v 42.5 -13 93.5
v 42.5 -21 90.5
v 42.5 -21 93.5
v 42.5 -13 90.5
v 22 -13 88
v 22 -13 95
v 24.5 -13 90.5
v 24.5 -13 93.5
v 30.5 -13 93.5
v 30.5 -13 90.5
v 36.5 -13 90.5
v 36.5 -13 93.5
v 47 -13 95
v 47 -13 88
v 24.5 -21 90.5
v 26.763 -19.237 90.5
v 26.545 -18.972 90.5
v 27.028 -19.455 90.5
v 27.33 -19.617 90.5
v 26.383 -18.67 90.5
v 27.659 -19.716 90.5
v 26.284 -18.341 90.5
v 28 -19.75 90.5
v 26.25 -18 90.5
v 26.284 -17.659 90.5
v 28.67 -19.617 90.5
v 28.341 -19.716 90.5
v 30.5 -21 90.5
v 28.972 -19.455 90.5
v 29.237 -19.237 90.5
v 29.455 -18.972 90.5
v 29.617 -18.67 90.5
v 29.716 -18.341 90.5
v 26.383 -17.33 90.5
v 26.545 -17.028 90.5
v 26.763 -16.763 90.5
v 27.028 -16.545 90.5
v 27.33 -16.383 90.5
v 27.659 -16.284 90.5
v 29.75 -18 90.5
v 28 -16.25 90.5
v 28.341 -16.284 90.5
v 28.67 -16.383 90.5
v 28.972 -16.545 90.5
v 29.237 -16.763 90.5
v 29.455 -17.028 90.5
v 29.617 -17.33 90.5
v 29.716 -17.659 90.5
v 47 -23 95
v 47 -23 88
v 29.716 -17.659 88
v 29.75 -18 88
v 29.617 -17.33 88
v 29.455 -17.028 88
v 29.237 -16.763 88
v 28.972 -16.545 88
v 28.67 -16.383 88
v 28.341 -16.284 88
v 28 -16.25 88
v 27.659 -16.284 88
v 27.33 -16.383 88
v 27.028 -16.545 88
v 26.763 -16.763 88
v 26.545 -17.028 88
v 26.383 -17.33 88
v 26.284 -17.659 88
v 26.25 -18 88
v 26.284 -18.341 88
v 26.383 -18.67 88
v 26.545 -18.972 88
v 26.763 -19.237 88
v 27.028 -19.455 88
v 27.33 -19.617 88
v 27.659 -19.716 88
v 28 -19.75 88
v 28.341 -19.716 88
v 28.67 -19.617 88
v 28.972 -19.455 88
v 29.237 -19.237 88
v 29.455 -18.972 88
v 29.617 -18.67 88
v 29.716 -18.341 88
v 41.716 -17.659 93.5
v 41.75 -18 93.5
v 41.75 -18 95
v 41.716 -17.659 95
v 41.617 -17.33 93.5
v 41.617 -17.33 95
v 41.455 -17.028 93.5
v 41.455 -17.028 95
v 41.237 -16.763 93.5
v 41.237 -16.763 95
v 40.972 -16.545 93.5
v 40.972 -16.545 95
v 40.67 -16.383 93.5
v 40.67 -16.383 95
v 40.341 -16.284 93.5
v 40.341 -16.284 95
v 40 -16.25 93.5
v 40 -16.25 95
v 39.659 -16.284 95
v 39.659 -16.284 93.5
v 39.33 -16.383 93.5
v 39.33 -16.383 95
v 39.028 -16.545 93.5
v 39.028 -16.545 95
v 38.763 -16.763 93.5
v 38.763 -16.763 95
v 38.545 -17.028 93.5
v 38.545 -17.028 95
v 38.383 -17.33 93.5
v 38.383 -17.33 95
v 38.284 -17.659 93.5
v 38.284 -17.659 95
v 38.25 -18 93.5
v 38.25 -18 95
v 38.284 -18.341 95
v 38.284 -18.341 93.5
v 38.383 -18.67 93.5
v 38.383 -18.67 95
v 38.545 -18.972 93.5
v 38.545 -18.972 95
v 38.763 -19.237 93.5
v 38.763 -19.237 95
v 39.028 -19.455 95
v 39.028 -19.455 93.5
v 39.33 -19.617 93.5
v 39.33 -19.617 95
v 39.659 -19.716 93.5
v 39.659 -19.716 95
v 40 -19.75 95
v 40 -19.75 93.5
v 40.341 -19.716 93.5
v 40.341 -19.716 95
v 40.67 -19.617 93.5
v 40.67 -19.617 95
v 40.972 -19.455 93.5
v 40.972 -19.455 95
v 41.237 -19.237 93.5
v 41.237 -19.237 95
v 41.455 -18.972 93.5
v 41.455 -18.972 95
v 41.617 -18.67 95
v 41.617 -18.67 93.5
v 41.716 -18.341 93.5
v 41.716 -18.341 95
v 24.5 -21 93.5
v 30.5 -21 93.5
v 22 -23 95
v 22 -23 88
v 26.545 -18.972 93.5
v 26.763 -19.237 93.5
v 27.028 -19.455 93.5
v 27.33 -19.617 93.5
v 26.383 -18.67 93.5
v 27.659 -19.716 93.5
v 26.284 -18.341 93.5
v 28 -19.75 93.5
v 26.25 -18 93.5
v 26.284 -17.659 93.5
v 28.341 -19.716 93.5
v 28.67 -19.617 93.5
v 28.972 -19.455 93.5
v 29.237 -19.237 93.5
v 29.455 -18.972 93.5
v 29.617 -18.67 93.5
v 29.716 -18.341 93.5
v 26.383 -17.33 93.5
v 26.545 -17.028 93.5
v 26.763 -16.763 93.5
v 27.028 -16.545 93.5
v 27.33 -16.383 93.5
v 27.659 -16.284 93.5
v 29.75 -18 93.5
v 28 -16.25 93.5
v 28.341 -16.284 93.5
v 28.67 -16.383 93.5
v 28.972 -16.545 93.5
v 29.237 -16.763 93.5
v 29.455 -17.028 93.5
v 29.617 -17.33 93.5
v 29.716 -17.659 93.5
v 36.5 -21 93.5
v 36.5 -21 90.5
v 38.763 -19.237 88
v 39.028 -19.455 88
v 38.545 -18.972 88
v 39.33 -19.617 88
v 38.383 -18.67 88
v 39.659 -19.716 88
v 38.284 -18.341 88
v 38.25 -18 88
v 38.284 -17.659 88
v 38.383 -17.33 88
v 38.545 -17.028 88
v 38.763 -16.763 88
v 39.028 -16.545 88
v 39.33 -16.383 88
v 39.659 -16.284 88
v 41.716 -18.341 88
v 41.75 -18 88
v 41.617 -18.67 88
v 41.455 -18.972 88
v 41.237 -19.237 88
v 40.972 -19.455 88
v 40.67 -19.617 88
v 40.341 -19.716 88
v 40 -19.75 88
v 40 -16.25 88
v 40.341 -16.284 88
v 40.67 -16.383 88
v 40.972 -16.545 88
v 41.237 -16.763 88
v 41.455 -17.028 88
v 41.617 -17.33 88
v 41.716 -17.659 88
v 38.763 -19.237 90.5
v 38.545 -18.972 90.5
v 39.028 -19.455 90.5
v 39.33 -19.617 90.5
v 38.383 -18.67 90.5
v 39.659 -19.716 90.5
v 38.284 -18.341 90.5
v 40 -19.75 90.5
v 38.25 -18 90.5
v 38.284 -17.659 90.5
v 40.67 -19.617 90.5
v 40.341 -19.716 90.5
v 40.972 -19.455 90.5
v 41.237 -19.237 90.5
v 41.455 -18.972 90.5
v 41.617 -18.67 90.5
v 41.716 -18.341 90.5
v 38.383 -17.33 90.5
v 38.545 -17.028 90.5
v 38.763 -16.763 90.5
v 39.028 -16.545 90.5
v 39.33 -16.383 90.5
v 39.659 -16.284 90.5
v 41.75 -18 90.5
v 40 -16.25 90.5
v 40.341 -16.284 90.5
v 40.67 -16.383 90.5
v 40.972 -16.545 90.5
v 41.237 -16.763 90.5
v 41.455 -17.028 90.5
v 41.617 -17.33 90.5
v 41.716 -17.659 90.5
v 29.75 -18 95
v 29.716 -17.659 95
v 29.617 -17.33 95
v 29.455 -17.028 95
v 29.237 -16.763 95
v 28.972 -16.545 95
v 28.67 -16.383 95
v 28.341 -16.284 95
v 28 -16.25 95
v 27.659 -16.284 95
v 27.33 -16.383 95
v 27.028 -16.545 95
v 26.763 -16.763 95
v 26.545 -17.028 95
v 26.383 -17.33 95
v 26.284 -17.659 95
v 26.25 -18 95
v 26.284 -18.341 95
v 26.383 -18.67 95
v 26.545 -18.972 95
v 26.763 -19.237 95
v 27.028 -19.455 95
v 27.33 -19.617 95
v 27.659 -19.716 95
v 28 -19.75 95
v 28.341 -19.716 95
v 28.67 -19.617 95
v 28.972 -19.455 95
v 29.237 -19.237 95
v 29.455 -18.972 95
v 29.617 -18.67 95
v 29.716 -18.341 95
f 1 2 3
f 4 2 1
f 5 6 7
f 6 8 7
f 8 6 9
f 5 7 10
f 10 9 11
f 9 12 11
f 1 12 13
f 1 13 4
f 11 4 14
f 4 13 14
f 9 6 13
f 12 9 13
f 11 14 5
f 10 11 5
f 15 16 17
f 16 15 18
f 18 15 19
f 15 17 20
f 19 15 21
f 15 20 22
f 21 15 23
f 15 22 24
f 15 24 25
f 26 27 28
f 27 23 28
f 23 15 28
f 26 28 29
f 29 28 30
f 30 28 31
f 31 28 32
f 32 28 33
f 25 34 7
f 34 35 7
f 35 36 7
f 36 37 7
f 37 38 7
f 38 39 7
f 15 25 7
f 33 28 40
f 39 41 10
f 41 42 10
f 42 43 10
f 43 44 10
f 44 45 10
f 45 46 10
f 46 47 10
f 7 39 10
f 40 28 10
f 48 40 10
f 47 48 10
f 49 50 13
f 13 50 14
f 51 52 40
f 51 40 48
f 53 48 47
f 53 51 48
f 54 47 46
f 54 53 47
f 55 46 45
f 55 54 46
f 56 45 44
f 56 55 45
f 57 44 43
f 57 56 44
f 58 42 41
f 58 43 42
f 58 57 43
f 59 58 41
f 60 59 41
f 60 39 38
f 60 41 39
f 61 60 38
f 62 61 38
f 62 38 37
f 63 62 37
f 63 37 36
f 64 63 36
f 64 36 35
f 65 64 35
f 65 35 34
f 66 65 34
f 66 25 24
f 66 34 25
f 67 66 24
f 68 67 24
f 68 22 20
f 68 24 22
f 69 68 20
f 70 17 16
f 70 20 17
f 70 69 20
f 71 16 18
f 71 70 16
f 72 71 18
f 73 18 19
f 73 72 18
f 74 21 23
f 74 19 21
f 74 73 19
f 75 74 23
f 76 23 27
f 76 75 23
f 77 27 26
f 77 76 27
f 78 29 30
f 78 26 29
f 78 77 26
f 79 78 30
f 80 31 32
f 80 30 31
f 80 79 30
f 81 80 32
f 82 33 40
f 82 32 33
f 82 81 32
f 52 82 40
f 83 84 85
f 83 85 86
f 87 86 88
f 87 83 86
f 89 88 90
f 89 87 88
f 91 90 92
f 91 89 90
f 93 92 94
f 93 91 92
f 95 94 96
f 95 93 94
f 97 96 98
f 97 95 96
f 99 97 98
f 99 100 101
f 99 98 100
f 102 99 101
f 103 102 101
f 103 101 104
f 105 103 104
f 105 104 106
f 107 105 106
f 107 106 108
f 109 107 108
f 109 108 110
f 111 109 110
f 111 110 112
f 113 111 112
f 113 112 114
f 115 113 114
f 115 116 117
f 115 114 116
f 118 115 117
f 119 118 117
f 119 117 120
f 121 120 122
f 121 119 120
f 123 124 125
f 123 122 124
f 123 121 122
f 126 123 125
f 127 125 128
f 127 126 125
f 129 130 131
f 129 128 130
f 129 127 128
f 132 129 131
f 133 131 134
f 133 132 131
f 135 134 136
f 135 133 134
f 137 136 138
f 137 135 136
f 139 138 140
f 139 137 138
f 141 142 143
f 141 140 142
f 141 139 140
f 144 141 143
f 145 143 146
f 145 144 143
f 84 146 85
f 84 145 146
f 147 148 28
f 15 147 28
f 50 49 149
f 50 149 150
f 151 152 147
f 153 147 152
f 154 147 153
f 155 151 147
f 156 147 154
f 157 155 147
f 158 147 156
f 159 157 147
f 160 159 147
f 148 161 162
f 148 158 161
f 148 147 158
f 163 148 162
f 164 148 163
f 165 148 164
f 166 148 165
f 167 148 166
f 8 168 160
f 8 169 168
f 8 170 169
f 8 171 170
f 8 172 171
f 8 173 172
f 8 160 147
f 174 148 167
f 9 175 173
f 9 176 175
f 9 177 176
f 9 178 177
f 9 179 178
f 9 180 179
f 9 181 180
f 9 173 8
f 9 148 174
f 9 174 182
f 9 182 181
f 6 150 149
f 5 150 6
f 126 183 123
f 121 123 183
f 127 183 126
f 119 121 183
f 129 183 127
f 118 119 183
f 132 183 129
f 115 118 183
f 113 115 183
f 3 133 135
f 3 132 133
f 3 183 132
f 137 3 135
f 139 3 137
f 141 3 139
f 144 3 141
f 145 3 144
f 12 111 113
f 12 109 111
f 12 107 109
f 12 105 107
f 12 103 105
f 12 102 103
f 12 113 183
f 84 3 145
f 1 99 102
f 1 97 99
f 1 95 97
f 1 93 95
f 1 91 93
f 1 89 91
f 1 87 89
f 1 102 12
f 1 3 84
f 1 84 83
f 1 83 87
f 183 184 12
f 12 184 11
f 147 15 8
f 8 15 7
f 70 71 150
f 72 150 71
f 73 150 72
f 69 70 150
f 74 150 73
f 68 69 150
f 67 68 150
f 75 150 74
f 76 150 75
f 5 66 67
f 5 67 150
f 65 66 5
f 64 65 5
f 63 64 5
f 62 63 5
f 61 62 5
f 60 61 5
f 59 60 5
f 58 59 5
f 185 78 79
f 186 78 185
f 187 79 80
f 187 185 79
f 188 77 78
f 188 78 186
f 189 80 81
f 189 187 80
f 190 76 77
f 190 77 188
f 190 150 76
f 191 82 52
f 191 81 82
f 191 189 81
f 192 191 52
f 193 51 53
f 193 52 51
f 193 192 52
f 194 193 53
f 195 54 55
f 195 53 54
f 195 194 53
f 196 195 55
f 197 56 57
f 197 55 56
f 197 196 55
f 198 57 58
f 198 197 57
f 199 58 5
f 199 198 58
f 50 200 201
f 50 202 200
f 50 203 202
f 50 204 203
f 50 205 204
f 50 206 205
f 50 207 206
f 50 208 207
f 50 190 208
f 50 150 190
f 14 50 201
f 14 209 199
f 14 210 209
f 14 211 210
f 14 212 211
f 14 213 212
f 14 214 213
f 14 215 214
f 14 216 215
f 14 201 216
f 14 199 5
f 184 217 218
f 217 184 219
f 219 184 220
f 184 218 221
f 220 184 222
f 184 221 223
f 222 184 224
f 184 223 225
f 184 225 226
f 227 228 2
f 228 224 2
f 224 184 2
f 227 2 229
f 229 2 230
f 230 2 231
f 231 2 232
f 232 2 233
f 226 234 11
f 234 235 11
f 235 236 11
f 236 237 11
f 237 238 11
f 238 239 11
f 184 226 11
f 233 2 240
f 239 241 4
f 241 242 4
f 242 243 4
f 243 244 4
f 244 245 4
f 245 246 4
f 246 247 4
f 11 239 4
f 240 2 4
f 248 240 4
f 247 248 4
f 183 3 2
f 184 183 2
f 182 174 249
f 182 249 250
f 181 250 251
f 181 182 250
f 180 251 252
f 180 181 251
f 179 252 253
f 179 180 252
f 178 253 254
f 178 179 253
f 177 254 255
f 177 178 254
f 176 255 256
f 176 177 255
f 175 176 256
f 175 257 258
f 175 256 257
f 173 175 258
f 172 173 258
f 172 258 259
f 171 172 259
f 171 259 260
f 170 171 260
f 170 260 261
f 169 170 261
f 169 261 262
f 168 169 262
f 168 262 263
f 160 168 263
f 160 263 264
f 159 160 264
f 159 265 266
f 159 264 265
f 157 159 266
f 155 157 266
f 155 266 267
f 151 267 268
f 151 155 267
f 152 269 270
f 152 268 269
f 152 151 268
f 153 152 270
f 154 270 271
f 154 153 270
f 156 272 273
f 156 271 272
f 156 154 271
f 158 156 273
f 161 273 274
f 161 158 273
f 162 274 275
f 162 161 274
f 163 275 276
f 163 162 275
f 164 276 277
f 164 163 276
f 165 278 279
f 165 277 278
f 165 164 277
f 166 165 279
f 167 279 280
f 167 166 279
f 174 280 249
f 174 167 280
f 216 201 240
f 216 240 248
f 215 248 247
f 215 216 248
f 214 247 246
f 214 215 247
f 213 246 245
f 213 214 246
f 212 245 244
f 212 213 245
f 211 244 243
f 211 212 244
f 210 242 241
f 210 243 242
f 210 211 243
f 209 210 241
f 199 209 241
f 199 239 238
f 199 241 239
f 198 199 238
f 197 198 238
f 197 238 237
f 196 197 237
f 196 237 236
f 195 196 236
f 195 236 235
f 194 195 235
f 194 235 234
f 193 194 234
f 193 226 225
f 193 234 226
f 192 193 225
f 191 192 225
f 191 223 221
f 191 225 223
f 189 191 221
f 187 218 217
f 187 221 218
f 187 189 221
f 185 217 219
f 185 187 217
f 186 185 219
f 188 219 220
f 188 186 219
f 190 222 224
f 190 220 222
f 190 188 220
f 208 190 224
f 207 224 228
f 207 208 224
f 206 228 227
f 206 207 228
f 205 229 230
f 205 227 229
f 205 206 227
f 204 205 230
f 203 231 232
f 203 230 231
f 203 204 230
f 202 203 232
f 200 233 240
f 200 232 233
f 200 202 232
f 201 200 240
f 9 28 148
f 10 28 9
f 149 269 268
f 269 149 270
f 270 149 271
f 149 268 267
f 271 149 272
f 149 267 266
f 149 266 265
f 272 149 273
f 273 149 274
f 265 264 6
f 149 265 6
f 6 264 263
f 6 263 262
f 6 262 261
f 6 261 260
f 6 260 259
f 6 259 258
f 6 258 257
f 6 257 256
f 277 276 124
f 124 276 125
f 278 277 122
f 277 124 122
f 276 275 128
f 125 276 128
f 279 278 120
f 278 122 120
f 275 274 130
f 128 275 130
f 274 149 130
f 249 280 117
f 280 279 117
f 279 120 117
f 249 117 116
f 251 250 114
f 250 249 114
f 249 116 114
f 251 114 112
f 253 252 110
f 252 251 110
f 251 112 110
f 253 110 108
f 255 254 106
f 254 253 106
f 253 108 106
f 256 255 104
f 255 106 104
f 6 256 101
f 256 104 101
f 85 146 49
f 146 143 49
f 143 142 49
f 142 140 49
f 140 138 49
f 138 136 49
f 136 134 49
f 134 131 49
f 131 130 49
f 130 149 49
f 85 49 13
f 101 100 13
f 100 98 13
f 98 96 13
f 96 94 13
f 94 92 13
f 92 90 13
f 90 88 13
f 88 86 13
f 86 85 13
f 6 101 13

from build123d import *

# Parameters (mm, degrees)
CYLINDER028_R          = 1.75
CYLINDER028_DEPTH      = 20
CYLINDER027_R          = 1.75
CYLINDER027_DEPTH      = 20
BOX045_W               = 8
BOX045_H               = 3
BOX045_DEPTH           = 6
BOX044_W               = 8
BOX044_H               = 3
BOX044_DEPTH           = 6
BOX043_W               = 10
BOX043_H               = 7
BOX043_DEPTH           = 25
CUT044_ROLL_ANGLE      = -90
CUT044_PLACEMENT_ANGLE = 90


with BuildPart() as cylinder063:
    # Cylinder028 → Cylinder028 (new body)
    with BuildSketch(Plane(origin=(40, -18, 77), x_dir=(1, 0, 0), z_dir=(0, 0, 1))):
        Circle(CYLINDER028_R)
    extrude(amount=CYLINDER028_DEPTH)


with BuildPart() as cylinder062:
    # Cylinder027 → Cylinder027 (new body)
    with BuildSketch(Plane(origin=(28, -18, 77), x_dir=(1, 0, 0), z_dir=(0, 0, 1))):
        Circle(CYLINDER027_R)
    extrude(amount=CYLINDER027_DEPTH)


with BuildPart() as cube044:
    # Box045 → Box045 (new body)
    with BuildSketch(Plane(origin=(32, 5.5, 26.5), x_dir=(1, 0, 0), z_dir=(0, 0, 1))):
        with Locations((4, 1.5)):
            Rectangle(BOX045_W, BOX045_H)
    extrude(amount=BOX045_DEPTH)


with BuildPart() as cube043:
    # Box044 → Box044 (new body)
    with BuildSketch(Plane(origin=(32, 5.5, 38.5), x_dir=(1, 0, 0), z_dir=(0, 0, 1))):
        with Locations((4, 1.5)):
            Rectangle(BOX044_W, BOX044_H)
    extrude(amount=BOX044_DEPTH)


with BuildPart() as tuerca_puente:
    # Box043 → Box043 (new body)
    with BuildSketch(Plane(origin=(30, 4, 22), x_dir=(1, 0, 0), z_dir=(0, 0, 1))):
        with Locations((5, 3.5)):
            Rectangle(BOX043_W, BOX043_H)
    extrude(amount=BOX043_DEPTH)

    # Cut043: cut Cube043
    add(cube043.part, mode=Mode.SUBTRACT)

    # Cut044: cut Cube044
    add(cube044.part, mode=Mode.SUBTRACT)


with BuildPart() as tuerca_puente_1:
    # Cut044 roll: moved
    add(tuerca_puente.part.rotate(Axis((0, 0, 0), (1, 0, 0)), CUT044_ROLL_ANGLE))


with BuildPart() as tuerca_puente_2:
    # Cut044 placement: moved
    add(tuerca_puente_1.part.moved(Location((69, -53, 97))).rotate(Axis((69, -53, 97), (0, 0, 1)), CUT044_PLACEMENT_ANGLE))

    # Cut051: cut Cylinder062
    add(cylinder062.part, mode=Mode.SUBTRACT)

    # Cut052: cut Cylinder063
    add(cylinder063.part, mode=Mode.SUBTRACT)


with BuildPart() as tuerca_puente_3:
    # Cut052 placement: moved
    add(tuerca_puente_2.part.moved(Location((0, 0, 2))))


solid = tuerca_puente_3.part
